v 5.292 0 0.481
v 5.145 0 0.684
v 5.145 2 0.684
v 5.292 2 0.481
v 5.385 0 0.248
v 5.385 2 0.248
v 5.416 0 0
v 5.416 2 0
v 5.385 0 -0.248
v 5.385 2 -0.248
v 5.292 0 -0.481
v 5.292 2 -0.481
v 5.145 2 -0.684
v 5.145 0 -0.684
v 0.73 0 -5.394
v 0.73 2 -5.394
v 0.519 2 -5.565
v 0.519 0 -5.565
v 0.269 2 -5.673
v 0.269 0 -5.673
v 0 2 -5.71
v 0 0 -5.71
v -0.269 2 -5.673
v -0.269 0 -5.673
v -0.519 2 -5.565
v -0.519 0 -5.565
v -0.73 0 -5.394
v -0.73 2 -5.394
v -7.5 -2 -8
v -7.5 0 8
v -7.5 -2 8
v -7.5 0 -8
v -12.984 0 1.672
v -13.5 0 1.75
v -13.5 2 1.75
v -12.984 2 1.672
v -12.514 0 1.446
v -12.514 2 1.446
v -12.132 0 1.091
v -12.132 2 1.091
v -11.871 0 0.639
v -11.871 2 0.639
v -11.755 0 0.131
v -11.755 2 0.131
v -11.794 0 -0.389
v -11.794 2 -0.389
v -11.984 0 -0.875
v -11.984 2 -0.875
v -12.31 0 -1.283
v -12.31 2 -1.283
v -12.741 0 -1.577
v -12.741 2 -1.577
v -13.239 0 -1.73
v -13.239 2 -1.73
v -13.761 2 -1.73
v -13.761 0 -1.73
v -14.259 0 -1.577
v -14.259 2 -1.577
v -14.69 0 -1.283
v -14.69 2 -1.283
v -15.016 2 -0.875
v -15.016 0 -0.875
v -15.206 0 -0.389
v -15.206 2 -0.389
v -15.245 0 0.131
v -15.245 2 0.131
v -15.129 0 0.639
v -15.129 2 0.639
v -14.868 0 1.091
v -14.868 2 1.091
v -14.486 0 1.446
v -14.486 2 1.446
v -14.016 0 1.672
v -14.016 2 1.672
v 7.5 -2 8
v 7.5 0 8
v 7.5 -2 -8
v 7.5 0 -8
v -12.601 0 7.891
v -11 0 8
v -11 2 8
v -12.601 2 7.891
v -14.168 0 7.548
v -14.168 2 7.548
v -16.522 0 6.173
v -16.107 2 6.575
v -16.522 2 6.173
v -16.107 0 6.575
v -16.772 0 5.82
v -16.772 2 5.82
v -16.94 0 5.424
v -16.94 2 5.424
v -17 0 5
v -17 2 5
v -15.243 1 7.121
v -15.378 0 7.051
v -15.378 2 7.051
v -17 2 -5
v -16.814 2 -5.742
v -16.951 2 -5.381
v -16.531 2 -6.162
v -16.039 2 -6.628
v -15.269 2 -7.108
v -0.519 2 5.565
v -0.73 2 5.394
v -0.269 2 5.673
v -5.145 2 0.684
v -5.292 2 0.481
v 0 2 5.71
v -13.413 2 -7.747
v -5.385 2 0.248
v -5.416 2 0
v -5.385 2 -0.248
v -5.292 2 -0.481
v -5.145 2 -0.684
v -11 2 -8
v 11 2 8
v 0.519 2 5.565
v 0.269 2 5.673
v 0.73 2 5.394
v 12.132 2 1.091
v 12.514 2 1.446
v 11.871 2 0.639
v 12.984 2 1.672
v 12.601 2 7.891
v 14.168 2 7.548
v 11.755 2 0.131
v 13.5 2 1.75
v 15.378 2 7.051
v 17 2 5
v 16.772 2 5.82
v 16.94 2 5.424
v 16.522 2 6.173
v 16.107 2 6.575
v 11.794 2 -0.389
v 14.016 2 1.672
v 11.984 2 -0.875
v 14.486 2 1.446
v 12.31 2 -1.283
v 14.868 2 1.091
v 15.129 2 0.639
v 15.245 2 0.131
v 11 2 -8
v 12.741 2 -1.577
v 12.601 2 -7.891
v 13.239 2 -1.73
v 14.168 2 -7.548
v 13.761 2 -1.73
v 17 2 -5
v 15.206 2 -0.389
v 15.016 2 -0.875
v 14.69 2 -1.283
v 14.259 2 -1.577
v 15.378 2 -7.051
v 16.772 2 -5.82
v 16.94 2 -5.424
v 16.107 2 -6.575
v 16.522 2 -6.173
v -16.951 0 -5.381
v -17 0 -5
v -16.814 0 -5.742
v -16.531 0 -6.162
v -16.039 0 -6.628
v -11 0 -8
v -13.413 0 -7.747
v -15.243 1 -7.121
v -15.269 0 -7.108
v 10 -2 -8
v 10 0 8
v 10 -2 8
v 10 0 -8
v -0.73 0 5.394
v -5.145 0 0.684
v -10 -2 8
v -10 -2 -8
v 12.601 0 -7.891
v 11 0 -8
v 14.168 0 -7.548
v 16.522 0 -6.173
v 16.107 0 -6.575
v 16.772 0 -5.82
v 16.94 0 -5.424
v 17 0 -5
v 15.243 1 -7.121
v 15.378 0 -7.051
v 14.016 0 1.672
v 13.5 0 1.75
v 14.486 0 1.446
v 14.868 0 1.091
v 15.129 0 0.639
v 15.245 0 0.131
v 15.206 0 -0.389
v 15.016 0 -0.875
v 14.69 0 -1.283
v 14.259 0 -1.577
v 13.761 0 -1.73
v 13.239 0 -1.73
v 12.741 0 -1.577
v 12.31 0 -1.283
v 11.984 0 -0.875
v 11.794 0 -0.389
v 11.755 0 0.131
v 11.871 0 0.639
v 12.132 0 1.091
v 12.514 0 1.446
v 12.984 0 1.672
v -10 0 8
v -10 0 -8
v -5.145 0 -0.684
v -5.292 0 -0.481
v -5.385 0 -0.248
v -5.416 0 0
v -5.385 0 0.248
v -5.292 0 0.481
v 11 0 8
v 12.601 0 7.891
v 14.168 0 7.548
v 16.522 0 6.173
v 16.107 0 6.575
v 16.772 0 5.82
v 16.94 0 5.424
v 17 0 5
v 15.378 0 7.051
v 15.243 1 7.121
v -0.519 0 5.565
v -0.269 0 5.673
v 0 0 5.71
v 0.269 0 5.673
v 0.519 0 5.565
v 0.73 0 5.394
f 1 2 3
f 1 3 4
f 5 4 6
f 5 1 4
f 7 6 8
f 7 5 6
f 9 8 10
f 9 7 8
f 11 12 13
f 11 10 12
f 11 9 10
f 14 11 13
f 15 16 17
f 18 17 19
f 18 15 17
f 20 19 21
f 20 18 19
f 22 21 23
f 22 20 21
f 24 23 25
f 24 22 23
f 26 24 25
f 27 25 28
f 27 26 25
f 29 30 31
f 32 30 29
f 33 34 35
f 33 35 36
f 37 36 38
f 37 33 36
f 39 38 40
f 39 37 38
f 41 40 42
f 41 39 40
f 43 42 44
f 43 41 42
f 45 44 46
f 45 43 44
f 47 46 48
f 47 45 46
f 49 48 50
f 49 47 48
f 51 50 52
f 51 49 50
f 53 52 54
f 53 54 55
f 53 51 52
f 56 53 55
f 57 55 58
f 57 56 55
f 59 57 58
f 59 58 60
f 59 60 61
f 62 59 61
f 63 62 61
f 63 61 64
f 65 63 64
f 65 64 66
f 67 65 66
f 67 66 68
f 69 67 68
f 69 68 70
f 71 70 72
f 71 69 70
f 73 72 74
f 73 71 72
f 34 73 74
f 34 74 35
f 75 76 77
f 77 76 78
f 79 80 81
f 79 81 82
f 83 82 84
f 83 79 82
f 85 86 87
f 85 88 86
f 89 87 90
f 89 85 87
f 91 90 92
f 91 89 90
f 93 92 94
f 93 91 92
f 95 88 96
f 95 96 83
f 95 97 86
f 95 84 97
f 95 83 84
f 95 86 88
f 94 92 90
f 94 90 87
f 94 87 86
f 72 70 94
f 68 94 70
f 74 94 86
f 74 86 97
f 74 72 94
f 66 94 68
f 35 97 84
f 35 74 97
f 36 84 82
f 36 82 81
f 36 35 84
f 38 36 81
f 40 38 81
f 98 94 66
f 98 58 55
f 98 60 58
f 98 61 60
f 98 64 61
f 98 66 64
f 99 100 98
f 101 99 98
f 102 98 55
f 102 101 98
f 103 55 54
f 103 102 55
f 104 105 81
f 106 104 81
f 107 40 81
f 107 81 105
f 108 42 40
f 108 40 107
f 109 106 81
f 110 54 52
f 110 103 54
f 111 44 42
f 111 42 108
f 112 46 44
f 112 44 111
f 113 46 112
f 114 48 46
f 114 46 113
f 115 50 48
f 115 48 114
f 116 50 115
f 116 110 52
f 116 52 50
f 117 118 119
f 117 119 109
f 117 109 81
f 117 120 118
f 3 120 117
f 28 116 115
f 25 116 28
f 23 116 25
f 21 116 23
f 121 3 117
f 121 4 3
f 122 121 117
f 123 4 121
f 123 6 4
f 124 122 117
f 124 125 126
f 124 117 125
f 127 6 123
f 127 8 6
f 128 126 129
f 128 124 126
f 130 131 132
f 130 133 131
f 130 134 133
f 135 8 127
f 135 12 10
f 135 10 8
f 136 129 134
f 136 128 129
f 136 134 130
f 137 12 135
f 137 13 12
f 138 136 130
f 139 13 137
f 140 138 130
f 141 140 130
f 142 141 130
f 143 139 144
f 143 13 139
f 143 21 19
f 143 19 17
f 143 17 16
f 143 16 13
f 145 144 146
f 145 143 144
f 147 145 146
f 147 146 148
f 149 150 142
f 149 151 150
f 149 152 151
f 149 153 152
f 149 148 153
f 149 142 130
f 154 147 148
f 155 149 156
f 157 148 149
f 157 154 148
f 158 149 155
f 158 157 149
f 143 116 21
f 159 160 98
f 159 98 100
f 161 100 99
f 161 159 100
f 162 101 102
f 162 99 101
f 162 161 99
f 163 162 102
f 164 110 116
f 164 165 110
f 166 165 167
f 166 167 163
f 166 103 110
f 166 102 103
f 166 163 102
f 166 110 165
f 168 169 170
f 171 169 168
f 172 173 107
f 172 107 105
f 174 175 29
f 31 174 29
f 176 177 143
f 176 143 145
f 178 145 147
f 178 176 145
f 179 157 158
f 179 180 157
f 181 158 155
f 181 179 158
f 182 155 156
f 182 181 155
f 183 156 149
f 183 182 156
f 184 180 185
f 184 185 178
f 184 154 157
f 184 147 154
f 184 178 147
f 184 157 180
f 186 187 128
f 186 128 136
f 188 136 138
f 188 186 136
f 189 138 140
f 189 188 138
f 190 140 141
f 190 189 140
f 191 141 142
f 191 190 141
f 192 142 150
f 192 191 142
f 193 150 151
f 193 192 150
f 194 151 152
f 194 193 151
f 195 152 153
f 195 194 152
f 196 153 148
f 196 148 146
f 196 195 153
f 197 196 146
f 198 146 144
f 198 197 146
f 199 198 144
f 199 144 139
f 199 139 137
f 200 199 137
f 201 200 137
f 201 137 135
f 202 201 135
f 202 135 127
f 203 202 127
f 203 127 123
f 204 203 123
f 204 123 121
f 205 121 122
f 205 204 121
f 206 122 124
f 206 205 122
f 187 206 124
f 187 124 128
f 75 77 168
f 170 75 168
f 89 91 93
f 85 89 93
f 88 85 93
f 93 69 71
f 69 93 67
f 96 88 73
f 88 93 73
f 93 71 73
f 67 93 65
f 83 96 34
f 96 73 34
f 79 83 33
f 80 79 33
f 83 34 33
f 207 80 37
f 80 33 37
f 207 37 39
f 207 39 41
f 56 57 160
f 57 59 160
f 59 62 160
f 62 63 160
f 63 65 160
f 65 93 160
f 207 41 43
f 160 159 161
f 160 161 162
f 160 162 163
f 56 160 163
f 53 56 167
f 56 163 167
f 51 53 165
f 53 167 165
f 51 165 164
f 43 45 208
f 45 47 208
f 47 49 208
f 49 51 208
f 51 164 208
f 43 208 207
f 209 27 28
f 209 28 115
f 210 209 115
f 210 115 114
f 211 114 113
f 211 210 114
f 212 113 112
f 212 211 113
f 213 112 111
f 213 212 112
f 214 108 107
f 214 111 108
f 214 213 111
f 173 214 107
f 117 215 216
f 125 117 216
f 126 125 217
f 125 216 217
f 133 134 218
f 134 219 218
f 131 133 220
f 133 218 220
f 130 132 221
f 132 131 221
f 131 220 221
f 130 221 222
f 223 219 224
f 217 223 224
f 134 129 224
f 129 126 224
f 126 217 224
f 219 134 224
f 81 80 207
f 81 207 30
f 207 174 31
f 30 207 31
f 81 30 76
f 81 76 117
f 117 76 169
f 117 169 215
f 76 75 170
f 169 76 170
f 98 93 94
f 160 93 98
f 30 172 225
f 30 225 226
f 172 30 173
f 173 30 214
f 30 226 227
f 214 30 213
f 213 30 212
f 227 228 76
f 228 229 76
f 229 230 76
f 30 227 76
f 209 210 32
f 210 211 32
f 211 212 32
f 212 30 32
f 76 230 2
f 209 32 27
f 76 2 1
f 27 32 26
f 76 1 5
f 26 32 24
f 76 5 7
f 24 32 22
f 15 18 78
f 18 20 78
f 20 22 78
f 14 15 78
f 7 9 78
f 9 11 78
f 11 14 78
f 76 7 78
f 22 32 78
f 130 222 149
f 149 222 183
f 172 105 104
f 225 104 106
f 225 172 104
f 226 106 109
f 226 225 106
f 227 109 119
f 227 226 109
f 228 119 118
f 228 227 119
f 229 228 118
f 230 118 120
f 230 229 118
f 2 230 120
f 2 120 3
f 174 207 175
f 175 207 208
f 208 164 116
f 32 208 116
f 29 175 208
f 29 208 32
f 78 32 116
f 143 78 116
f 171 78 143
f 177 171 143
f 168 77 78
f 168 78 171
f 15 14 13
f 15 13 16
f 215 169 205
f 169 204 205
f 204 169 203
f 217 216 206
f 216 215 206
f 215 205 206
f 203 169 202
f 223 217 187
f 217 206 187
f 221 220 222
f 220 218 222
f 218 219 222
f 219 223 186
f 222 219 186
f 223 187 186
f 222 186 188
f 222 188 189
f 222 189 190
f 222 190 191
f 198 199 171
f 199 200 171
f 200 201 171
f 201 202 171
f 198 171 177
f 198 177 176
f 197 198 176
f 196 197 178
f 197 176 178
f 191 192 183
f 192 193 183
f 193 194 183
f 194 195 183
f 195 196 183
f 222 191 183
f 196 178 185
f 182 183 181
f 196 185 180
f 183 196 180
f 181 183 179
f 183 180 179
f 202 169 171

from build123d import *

# Parameters (mm, degrees)
SKETCH1_W           = 34
SKETCH1_H           = 16
SKETCH1_R           = 1.75
BOSS_EXTRUDE1_DEPTH = 2
SKETCH1_3_W         = 2.5
SKETCH1_3_H         = 16
BOSS_EXTRUDE2_DEPTH = 2
CUT_EXTRUDE2_DEPTH  = 19.894443628
FILLET1_SIZE        = 6
FILLET1_SIZE_2      = 3
FILLET2_SIZE        = 6
FILLET2_SIZE_2      = 3


with BuildPart() as part:
    # Sketch1 → Boss-Extrude1 (new body)
    with BuildSketch(Plane(origin=(0, 0, 0), x_dir=(1, 0, 0), z_dir=(0, 1, 0))):
        Rectangle(SKETCH1_W, SKETCH1_H)
        with Locations(Location((-13.5, 0, 0), (0, 0, 270))):
            Circle(SKETCH1_R, mode=Mode.SUBTRACT)
        with Locations(Location((13.5, 0, 0), (0, 0, 270))):
            Circle(SKETCH1_R, mode=Mode.SUBTRACT)
    extrude(amount=BOSS_EXTRUDE1_DEPTH)

    # Sketch1<3> → Boss-Extrude2 (add)
    with BuildSketch(Plane(origin=(0, 0, 0), x_dir=(1, 0, 0), z_dir=(0, 1, 0))):
        with Locations((-8.75, 0)):
            Rectangle(SKETCH1_3_W, SKETCH1_3_H)
        with Locations((8.75, 0)):
            Rectangle(SKETCH1_3_W, SKETCH1_3_H)
    extrude(amount=-BOSS_EXTRUDE2_DEPTH)

    # Sketch2 → Cut-Extrude2 (cut, through all)
    with BuildSketch(Plane.XZ):
        with BuildLine():
            ThreePointArc((-5.145390176, -0.683941129), (-5.415852972, 0), (-5.145390176, 0.683941129))
            Line((-5.145390176, 0.683941129), (-0.729537204, 5.394184299))
            ThreePointArc((-0.729537204, 5.394184299), (0, 5.71024317), (0.729537204, 5.394184299))
            Line((0.729537204, 5.394184299), (5.145390176, 0.683941129))
            ThreePointArc((5.145390176, 0.683941129), (5.415852972, 0), (5.145390176, -0.683941129))
            Line((5.145390176, -0.683941129), (0.729537204, -5.394184299))
            ThreePointArc((0.729537204, -5.394184299), (0, -5.71024317), (-0.729537204, -5.394184299))
            Line((-0.729537204, -5.394184299), (-5.145390176, -0.683941129))
        make_face()
    extrude(amount=-CUT_EXTRUDE2_DEPTH, mode=Mode.SUBTRACT)

    # Fillet1
    # an asymmetric fillet: 6, 3 mm, written as the material it takes off along each edge
    with BuildSketch(Plane(origin=(17, -15, 8), x_dir=(-1, 0, 0), z_dir=(0, 1, 0))) as fillet1_piece_1:
        with BuildLine():
            Bezier((FILLET1_SIZE, 0), (0, 0), (0, -FILLET1_SIZE_2), weights=[1, 0.707106781, 1])
            Line((0, -FILLET1_SIZE_2), (0, 0))
            Line((0, 0), (FILLET1_SIZE, 0))
        make_face()
    extrude(amount=32, mode=Mode.SUBTRACT)
    with BuildSketch(Plane(origin=(-17, -15, -8), x_dir=(0, 0, 1), z_dir=(0, 1, 0))) as fillet1_piece_2:
        with BuildLine():
            Bezier((FILLET1_SIZE_2, 0), (0, 0), (0, FILLET1_SIZE), weights=[1, 0.707106781, 1])
            Line((0, FILLET1_SIZE), (0, 0))
            Line((0, 0), (FILLET1_SIZE_2, 0))
        make_face()
    extrude(amount=32, mode=Mode.SUBTRACT)

    # Fillet2
    # an asymmetric fillet: 6, 3 mm, written as the material it takes off along each edge
    with BuildSketch(Plane(origin=(17, -15, -8), x_dir=(-1, 0, 0), z_dir=(0, 1, 0)), Plane(origin=(-17, -15, 8), x_dir=(1, 0, 0), z_dir=(0, 1, 0))) as fillet2_piece_1:
        with BuildLine():
            Bezier((FILLET2_SIZE, 0), (0, 0), (0, FILLET2_SIZE_2), weights=[1, 0.707106781, 1])
            Line((0, FILLET2_SIZE_2), (0, 0))
            Line((0, 0), (FILLET2_SIZE, 0))
        make_face()
    extrude(amount=32, mode=Mode.SUBTRACT)


solid = part.part
